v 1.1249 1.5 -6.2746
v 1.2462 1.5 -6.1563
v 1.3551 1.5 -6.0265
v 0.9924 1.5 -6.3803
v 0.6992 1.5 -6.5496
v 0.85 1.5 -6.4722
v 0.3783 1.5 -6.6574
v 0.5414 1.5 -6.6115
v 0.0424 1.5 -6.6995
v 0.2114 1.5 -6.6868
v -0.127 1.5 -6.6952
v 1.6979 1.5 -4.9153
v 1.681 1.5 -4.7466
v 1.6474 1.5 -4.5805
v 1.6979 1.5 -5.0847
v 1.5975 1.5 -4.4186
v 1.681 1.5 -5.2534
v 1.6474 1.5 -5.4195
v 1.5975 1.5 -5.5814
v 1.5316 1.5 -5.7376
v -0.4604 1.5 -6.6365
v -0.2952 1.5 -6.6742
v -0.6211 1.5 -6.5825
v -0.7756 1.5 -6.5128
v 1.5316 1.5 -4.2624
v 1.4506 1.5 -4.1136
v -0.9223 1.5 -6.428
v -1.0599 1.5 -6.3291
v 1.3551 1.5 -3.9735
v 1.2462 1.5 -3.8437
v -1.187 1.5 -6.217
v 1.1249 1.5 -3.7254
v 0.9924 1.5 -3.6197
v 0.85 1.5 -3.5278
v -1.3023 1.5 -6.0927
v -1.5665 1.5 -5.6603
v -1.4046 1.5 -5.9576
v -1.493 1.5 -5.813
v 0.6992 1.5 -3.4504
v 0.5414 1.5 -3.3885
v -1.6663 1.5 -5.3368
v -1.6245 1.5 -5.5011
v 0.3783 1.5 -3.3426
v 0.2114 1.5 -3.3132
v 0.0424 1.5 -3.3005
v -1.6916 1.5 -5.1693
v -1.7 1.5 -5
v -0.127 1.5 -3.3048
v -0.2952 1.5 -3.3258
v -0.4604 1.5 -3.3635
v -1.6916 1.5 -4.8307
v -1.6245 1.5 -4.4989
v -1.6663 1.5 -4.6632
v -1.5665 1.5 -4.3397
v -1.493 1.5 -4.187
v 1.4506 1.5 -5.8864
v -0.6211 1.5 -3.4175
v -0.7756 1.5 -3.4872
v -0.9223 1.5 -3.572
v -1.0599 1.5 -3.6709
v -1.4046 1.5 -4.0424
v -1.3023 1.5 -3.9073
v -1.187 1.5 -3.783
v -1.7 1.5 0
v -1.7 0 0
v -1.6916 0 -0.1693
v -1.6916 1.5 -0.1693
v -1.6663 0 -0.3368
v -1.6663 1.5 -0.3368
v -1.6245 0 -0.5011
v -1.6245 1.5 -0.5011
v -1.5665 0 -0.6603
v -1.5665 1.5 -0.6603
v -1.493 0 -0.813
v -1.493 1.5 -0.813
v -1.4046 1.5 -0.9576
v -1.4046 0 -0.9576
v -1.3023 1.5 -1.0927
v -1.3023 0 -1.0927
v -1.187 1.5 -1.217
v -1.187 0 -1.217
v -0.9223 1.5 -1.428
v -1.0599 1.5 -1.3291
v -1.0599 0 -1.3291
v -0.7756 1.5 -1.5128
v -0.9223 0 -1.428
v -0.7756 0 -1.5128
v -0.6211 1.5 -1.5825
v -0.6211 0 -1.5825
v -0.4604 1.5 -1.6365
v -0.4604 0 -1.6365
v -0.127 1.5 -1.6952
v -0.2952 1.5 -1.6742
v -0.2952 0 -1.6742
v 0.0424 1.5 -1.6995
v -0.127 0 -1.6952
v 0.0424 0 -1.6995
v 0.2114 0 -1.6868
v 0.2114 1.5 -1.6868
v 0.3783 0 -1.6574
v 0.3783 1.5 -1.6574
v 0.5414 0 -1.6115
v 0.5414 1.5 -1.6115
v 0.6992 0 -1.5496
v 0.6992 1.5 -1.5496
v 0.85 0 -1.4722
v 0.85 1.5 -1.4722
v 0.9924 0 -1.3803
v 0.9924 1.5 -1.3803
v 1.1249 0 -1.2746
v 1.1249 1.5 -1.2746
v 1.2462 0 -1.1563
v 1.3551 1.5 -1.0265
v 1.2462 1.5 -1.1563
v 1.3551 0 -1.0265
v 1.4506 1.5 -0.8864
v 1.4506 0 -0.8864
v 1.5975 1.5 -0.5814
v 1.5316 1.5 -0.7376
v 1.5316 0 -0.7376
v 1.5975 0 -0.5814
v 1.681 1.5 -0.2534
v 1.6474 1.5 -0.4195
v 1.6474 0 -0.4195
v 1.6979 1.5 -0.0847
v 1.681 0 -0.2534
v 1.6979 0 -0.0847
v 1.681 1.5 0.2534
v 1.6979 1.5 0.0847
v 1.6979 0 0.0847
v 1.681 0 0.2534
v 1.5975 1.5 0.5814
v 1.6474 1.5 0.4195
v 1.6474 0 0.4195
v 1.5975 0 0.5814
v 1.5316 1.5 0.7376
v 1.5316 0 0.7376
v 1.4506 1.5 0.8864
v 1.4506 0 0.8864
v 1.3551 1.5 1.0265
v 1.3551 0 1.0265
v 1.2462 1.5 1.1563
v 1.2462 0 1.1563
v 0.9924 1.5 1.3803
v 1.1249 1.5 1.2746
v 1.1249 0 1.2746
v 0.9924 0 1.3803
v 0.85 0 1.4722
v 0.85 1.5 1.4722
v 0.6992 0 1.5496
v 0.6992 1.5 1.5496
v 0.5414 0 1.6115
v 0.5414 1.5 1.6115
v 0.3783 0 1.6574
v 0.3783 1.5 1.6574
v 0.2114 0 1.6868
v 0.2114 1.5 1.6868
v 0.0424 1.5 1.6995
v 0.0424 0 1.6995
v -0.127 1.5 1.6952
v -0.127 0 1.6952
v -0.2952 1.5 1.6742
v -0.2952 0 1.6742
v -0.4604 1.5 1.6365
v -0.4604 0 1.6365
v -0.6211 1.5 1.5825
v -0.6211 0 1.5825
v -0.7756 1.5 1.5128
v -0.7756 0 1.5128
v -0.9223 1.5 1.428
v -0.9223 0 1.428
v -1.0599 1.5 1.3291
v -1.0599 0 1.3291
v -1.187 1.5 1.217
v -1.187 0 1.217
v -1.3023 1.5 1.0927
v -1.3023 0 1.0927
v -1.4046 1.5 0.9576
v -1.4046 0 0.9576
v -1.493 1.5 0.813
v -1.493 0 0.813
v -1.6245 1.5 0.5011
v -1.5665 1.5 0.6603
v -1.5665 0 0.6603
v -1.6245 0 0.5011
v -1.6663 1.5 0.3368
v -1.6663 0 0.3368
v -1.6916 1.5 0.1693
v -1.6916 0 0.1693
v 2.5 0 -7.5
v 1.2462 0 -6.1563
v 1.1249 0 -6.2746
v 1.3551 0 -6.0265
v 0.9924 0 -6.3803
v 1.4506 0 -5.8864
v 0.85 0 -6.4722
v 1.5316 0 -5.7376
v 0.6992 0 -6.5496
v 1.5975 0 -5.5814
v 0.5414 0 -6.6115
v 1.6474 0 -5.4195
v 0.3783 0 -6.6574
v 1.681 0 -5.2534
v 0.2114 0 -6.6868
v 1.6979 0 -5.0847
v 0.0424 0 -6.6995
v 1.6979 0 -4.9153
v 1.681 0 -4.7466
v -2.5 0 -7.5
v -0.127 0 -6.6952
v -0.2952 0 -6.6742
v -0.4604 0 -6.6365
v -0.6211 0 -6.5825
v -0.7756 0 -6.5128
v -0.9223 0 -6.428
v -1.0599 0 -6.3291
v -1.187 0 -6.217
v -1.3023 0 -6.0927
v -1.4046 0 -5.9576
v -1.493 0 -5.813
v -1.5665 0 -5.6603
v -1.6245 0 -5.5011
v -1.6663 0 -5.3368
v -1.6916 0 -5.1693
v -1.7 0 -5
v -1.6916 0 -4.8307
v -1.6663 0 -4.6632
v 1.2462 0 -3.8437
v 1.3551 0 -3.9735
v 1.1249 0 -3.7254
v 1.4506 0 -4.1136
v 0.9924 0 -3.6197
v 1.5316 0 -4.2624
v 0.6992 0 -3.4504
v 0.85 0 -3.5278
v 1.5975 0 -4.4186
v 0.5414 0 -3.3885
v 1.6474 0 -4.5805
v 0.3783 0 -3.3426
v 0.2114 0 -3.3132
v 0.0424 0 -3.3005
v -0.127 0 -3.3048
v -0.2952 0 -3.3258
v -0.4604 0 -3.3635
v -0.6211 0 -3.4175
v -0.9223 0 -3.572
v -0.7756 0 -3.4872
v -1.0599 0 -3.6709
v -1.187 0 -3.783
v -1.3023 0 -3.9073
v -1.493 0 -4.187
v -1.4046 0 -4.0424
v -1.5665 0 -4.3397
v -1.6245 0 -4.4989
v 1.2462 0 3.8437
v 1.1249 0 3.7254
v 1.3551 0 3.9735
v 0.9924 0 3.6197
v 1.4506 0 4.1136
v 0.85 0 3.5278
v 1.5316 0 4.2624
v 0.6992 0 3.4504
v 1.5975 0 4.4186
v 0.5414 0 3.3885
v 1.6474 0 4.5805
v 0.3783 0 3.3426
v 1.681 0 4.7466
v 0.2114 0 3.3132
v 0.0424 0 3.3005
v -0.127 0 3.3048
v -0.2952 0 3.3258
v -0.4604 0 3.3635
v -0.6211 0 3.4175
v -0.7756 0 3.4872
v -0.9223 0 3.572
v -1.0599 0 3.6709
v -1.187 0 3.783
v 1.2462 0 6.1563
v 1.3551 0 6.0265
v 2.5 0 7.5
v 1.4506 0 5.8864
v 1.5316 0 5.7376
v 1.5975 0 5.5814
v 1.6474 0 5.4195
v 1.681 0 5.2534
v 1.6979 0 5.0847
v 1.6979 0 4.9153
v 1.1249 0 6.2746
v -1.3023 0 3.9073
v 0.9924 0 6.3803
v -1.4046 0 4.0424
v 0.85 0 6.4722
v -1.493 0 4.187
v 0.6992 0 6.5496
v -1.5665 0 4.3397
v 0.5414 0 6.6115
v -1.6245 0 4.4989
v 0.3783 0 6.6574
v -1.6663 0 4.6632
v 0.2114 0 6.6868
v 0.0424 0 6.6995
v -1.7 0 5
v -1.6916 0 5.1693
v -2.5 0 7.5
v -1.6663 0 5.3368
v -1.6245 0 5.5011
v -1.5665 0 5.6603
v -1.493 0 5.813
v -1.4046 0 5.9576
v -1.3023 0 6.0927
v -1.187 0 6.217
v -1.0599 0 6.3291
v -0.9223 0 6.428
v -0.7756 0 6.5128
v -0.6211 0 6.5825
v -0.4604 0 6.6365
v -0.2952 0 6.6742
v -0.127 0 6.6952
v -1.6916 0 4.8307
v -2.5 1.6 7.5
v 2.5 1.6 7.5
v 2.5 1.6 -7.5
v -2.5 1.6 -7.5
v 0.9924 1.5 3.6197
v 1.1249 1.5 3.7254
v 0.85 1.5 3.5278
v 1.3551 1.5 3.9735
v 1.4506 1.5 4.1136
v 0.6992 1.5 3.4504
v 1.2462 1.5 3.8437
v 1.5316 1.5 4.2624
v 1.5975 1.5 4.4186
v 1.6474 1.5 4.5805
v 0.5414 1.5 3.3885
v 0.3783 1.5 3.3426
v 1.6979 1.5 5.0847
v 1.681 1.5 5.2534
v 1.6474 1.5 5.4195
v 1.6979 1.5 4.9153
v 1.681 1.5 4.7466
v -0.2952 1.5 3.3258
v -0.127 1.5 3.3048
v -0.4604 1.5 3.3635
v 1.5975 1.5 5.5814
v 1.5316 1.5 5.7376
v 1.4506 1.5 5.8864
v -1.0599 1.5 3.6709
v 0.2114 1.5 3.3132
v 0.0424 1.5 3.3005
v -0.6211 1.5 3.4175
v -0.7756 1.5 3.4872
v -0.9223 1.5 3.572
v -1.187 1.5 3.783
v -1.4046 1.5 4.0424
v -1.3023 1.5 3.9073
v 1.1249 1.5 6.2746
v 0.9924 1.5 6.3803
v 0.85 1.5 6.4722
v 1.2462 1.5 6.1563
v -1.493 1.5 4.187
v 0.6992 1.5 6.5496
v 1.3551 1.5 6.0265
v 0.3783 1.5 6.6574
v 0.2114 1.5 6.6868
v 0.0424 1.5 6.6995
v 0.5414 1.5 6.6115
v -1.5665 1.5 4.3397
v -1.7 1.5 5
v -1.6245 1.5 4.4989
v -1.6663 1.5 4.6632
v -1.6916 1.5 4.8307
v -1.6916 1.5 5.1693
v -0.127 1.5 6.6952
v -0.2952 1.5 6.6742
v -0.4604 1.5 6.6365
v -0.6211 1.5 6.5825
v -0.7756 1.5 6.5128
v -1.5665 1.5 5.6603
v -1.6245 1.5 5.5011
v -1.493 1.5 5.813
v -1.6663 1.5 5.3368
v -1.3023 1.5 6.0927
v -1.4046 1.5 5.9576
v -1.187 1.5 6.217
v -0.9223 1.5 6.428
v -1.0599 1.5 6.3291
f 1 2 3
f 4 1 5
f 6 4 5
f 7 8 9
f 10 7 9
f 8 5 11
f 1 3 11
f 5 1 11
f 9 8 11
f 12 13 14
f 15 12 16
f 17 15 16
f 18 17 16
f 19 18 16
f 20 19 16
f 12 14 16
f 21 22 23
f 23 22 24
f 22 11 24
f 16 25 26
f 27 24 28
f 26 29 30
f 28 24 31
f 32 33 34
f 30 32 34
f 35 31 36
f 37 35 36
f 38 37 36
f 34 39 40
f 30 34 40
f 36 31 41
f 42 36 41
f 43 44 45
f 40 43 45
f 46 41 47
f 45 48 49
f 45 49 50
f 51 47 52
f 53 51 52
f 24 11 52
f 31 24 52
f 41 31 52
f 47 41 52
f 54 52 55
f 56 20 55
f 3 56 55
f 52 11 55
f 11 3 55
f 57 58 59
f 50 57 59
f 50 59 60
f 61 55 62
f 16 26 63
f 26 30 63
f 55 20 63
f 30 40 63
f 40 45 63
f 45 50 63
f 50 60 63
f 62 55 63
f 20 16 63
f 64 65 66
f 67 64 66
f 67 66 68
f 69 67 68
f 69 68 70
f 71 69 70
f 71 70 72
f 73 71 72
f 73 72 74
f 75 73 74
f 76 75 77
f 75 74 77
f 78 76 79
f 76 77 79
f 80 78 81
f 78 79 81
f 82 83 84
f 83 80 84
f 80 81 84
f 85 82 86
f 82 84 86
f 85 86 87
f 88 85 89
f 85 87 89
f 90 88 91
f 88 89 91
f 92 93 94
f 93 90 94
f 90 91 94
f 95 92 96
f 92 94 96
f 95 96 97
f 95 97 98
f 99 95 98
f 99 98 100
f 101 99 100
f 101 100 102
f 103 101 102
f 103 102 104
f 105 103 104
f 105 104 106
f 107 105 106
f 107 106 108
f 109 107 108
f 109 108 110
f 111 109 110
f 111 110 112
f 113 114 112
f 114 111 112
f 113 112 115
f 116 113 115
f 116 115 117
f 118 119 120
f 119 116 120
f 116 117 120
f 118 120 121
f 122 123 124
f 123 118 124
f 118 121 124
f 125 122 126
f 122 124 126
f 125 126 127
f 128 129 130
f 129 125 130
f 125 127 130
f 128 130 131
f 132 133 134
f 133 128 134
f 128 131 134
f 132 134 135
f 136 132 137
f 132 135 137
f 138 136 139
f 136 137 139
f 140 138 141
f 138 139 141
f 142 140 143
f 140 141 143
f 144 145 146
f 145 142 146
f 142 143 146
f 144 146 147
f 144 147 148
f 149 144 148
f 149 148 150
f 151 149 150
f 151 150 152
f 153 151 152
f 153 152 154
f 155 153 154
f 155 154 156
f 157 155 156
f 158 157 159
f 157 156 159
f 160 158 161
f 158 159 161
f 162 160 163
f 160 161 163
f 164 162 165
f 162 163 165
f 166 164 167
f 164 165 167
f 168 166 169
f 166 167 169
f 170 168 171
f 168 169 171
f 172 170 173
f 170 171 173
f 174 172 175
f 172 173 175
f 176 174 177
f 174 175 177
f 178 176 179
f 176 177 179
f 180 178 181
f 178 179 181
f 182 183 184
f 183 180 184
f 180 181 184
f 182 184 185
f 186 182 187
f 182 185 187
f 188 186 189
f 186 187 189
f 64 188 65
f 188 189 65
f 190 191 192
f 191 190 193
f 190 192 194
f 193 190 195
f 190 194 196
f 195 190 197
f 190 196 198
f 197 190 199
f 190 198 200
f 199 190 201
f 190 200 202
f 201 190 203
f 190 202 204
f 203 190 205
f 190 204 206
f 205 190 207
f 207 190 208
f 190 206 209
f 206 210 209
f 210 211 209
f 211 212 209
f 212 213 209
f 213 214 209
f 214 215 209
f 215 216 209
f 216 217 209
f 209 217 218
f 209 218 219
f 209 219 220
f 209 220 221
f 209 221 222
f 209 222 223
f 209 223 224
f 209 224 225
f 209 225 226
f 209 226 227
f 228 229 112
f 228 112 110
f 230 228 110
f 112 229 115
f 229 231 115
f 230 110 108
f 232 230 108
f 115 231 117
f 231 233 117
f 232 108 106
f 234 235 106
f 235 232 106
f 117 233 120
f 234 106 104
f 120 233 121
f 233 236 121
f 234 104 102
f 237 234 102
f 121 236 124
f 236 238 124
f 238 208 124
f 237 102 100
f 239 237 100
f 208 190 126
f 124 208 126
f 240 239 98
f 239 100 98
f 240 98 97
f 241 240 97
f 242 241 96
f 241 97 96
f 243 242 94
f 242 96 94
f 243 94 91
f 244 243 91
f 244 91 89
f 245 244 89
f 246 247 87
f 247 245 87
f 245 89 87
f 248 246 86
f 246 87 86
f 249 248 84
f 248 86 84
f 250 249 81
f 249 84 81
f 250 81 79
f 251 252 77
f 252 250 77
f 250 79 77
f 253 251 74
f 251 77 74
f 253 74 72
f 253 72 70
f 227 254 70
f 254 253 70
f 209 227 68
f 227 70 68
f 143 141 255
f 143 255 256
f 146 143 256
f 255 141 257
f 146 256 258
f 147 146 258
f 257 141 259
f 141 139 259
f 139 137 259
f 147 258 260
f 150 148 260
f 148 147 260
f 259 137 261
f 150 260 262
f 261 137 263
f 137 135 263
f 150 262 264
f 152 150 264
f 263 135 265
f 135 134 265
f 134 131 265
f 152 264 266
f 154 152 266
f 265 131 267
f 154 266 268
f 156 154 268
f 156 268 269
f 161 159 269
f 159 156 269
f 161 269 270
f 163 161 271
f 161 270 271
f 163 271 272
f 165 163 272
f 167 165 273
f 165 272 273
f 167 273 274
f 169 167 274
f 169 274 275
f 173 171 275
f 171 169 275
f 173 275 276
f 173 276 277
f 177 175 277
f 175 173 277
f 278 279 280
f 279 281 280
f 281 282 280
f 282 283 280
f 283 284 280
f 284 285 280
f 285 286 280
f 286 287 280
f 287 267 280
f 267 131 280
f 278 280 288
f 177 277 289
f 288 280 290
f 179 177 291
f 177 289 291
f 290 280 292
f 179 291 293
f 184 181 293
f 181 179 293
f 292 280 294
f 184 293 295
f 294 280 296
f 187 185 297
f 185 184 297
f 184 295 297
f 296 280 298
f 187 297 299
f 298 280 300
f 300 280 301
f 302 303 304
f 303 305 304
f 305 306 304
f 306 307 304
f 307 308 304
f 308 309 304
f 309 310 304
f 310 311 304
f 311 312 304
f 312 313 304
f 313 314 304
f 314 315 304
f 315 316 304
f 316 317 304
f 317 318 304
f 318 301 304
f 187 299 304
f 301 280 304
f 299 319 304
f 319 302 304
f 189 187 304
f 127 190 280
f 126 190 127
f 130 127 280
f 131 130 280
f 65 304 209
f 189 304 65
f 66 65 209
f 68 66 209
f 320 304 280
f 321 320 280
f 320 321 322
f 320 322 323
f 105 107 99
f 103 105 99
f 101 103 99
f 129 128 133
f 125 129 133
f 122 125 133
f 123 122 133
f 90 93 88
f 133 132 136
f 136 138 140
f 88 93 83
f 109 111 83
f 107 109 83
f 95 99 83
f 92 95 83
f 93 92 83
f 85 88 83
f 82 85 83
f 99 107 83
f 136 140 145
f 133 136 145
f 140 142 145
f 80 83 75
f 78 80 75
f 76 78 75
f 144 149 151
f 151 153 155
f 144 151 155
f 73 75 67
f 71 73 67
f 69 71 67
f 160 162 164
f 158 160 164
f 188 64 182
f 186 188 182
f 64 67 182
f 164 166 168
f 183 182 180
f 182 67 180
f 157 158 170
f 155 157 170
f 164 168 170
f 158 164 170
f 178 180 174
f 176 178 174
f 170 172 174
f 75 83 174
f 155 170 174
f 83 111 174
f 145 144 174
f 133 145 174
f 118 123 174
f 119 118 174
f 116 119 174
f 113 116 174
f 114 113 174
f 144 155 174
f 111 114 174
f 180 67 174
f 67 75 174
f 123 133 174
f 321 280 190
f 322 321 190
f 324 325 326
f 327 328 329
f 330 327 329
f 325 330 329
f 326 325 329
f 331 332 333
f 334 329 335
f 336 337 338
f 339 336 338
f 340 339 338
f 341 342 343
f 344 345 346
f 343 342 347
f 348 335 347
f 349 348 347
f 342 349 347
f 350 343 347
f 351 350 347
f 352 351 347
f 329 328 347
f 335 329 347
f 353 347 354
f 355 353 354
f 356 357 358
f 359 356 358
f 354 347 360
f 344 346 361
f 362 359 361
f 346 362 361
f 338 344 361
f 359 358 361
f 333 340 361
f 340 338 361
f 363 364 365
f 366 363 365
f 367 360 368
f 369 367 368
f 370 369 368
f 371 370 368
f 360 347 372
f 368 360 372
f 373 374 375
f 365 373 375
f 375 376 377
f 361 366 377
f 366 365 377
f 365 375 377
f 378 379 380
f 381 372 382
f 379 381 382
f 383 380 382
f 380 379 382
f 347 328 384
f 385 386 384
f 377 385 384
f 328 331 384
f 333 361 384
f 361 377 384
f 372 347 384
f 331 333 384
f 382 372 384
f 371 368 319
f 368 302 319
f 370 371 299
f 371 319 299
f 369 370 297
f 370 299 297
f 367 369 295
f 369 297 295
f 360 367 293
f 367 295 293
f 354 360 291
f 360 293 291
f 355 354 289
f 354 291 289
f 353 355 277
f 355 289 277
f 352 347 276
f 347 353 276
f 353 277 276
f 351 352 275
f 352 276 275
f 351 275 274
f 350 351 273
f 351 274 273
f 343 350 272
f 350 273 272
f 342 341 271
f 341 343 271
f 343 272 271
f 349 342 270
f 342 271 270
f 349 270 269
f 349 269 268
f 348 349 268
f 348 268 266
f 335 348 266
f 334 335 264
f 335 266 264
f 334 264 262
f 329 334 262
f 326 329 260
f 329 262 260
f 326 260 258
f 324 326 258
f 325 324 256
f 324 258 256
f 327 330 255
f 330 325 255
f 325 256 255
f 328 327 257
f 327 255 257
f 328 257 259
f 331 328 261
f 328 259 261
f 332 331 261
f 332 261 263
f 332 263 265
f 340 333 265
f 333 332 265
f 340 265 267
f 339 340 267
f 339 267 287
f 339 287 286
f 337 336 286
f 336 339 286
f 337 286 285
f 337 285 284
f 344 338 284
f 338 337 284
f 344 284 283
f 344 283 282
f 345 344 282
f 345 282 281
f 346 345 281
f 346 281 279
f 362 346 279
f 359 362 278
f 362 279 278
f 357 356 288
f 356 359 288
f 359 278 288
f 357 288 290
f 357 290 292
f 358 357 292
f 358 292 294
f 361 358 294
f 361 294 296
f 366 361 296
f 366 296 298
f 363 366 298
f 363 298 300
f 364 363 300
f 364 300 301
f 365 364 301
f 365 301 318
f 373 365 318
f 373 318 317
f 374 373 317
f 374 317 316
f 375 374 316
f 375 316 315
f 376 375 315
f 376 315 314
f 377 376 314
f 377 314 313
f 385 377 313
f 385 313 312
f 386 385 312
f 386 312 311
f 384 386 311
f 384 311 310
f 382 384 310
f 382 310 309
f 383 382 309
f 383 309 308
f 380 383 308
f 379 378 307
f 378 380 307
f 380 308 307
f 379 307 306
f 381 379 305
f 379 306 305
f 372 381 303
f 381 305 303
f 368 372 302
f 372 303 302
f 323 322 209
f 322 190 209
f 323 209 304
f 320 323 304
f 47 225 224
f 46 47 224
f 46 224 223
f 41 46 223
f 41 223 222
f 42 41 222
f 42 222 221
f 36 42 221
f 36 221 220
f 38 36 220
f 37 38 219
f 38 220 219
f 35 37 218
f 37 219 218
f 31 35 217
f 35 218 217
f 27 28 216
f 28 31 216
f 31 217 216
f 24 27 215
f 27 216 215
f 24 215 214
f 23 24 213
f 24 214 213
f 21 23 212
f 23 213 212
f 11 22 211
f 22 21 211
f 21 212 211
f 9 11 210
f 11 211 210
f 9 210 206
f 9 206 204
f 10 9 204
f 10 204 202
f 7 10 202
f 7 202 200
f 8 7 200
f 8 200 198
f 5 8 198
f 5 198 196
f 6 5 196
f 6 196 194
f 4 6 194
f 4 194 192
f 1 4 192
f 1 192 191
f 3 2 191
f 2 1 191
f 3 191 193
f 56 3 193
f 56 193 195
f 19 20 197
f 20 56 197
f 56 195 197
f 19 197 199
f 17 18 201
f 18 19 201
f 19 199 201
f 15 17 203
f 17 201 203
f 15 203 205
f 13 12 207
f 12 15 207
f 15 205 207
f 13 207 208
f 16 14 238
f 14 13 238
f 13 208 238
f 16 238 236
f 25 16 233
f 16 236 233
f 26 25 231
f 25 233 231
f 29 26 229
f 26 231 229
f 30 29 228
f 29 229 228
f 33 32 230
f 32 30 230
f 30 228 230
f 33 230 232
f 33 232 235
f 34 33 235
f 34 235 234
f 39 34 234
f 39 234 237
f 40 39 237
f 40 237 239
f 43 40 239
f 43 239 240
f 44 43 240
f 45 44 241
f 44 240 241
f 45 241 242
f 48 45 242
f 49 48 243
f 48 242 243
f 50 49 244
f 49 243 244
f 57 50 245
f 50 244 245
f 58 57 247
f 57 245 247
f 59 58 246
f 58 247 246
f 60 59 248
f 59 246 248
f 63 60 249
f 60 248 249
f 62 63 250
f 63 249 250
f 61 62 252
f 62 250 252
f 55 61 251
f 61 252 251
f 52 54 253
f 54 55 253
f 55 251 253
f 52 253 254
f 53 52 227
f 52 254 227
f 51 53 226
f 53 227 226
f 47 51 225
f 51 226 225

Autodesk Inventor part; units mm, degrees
ref_plane "YZ Plane" through (0, 0, 0) normal (1, 0, 0) x (0, 1, 0)
ref_plane "XZ Plane" through (0, 0, 0) normal (0, 1, 0) x (-1, 0, 0)
ref_plane "XY Plane" through (0, 0, 0) normal (0, 0, 1) x (1, 0, 0)
sketch "草圖1" plane through (0, 0, 0) normal (0, 1, 0) x (-1, 0, 0)
  line L0 (2.5, 7.5) -> (-2.5, 7.5)
  line L1 (-2.5, 7.5) -> (-2.5, -7.5)
  line L2 (-2.5, -7.5) -> (2.5, -7.5)
  line L3 (2.5, -7.5) -> (2.5, 7.5)
  circle A0 centre (0, 5) radius 1.7
  line L4 (2.5, 0) -> (-2.5, 0) construction
  circle A1 centre (0, -5) radius 1.7
  circle A2 centre (0, 0) radius 1.7
  point P0 (0, 7.5)
  dimension "d0" = 5
  dimension "d1" = 15
  dimension "d2" = 3.4
  dimension "d3" = 2.5
  dimension "d4" = 2.5
  dimension "d9" = 3.4
extrude "擠出1" add sketch "草圖1" along normal blind 1.6 contours L3 L2 L1 L0 | A0 | A1 | A2
extrude "擠出2" cut sketch "草圖1" along normal blind 1.5 contours A0 | A1
extrude "擠出3" cut sketch "草圖1" along normal blind 1.5 contours A2
properties part number "110033226_ipt_08_平滑面(2x1)"
